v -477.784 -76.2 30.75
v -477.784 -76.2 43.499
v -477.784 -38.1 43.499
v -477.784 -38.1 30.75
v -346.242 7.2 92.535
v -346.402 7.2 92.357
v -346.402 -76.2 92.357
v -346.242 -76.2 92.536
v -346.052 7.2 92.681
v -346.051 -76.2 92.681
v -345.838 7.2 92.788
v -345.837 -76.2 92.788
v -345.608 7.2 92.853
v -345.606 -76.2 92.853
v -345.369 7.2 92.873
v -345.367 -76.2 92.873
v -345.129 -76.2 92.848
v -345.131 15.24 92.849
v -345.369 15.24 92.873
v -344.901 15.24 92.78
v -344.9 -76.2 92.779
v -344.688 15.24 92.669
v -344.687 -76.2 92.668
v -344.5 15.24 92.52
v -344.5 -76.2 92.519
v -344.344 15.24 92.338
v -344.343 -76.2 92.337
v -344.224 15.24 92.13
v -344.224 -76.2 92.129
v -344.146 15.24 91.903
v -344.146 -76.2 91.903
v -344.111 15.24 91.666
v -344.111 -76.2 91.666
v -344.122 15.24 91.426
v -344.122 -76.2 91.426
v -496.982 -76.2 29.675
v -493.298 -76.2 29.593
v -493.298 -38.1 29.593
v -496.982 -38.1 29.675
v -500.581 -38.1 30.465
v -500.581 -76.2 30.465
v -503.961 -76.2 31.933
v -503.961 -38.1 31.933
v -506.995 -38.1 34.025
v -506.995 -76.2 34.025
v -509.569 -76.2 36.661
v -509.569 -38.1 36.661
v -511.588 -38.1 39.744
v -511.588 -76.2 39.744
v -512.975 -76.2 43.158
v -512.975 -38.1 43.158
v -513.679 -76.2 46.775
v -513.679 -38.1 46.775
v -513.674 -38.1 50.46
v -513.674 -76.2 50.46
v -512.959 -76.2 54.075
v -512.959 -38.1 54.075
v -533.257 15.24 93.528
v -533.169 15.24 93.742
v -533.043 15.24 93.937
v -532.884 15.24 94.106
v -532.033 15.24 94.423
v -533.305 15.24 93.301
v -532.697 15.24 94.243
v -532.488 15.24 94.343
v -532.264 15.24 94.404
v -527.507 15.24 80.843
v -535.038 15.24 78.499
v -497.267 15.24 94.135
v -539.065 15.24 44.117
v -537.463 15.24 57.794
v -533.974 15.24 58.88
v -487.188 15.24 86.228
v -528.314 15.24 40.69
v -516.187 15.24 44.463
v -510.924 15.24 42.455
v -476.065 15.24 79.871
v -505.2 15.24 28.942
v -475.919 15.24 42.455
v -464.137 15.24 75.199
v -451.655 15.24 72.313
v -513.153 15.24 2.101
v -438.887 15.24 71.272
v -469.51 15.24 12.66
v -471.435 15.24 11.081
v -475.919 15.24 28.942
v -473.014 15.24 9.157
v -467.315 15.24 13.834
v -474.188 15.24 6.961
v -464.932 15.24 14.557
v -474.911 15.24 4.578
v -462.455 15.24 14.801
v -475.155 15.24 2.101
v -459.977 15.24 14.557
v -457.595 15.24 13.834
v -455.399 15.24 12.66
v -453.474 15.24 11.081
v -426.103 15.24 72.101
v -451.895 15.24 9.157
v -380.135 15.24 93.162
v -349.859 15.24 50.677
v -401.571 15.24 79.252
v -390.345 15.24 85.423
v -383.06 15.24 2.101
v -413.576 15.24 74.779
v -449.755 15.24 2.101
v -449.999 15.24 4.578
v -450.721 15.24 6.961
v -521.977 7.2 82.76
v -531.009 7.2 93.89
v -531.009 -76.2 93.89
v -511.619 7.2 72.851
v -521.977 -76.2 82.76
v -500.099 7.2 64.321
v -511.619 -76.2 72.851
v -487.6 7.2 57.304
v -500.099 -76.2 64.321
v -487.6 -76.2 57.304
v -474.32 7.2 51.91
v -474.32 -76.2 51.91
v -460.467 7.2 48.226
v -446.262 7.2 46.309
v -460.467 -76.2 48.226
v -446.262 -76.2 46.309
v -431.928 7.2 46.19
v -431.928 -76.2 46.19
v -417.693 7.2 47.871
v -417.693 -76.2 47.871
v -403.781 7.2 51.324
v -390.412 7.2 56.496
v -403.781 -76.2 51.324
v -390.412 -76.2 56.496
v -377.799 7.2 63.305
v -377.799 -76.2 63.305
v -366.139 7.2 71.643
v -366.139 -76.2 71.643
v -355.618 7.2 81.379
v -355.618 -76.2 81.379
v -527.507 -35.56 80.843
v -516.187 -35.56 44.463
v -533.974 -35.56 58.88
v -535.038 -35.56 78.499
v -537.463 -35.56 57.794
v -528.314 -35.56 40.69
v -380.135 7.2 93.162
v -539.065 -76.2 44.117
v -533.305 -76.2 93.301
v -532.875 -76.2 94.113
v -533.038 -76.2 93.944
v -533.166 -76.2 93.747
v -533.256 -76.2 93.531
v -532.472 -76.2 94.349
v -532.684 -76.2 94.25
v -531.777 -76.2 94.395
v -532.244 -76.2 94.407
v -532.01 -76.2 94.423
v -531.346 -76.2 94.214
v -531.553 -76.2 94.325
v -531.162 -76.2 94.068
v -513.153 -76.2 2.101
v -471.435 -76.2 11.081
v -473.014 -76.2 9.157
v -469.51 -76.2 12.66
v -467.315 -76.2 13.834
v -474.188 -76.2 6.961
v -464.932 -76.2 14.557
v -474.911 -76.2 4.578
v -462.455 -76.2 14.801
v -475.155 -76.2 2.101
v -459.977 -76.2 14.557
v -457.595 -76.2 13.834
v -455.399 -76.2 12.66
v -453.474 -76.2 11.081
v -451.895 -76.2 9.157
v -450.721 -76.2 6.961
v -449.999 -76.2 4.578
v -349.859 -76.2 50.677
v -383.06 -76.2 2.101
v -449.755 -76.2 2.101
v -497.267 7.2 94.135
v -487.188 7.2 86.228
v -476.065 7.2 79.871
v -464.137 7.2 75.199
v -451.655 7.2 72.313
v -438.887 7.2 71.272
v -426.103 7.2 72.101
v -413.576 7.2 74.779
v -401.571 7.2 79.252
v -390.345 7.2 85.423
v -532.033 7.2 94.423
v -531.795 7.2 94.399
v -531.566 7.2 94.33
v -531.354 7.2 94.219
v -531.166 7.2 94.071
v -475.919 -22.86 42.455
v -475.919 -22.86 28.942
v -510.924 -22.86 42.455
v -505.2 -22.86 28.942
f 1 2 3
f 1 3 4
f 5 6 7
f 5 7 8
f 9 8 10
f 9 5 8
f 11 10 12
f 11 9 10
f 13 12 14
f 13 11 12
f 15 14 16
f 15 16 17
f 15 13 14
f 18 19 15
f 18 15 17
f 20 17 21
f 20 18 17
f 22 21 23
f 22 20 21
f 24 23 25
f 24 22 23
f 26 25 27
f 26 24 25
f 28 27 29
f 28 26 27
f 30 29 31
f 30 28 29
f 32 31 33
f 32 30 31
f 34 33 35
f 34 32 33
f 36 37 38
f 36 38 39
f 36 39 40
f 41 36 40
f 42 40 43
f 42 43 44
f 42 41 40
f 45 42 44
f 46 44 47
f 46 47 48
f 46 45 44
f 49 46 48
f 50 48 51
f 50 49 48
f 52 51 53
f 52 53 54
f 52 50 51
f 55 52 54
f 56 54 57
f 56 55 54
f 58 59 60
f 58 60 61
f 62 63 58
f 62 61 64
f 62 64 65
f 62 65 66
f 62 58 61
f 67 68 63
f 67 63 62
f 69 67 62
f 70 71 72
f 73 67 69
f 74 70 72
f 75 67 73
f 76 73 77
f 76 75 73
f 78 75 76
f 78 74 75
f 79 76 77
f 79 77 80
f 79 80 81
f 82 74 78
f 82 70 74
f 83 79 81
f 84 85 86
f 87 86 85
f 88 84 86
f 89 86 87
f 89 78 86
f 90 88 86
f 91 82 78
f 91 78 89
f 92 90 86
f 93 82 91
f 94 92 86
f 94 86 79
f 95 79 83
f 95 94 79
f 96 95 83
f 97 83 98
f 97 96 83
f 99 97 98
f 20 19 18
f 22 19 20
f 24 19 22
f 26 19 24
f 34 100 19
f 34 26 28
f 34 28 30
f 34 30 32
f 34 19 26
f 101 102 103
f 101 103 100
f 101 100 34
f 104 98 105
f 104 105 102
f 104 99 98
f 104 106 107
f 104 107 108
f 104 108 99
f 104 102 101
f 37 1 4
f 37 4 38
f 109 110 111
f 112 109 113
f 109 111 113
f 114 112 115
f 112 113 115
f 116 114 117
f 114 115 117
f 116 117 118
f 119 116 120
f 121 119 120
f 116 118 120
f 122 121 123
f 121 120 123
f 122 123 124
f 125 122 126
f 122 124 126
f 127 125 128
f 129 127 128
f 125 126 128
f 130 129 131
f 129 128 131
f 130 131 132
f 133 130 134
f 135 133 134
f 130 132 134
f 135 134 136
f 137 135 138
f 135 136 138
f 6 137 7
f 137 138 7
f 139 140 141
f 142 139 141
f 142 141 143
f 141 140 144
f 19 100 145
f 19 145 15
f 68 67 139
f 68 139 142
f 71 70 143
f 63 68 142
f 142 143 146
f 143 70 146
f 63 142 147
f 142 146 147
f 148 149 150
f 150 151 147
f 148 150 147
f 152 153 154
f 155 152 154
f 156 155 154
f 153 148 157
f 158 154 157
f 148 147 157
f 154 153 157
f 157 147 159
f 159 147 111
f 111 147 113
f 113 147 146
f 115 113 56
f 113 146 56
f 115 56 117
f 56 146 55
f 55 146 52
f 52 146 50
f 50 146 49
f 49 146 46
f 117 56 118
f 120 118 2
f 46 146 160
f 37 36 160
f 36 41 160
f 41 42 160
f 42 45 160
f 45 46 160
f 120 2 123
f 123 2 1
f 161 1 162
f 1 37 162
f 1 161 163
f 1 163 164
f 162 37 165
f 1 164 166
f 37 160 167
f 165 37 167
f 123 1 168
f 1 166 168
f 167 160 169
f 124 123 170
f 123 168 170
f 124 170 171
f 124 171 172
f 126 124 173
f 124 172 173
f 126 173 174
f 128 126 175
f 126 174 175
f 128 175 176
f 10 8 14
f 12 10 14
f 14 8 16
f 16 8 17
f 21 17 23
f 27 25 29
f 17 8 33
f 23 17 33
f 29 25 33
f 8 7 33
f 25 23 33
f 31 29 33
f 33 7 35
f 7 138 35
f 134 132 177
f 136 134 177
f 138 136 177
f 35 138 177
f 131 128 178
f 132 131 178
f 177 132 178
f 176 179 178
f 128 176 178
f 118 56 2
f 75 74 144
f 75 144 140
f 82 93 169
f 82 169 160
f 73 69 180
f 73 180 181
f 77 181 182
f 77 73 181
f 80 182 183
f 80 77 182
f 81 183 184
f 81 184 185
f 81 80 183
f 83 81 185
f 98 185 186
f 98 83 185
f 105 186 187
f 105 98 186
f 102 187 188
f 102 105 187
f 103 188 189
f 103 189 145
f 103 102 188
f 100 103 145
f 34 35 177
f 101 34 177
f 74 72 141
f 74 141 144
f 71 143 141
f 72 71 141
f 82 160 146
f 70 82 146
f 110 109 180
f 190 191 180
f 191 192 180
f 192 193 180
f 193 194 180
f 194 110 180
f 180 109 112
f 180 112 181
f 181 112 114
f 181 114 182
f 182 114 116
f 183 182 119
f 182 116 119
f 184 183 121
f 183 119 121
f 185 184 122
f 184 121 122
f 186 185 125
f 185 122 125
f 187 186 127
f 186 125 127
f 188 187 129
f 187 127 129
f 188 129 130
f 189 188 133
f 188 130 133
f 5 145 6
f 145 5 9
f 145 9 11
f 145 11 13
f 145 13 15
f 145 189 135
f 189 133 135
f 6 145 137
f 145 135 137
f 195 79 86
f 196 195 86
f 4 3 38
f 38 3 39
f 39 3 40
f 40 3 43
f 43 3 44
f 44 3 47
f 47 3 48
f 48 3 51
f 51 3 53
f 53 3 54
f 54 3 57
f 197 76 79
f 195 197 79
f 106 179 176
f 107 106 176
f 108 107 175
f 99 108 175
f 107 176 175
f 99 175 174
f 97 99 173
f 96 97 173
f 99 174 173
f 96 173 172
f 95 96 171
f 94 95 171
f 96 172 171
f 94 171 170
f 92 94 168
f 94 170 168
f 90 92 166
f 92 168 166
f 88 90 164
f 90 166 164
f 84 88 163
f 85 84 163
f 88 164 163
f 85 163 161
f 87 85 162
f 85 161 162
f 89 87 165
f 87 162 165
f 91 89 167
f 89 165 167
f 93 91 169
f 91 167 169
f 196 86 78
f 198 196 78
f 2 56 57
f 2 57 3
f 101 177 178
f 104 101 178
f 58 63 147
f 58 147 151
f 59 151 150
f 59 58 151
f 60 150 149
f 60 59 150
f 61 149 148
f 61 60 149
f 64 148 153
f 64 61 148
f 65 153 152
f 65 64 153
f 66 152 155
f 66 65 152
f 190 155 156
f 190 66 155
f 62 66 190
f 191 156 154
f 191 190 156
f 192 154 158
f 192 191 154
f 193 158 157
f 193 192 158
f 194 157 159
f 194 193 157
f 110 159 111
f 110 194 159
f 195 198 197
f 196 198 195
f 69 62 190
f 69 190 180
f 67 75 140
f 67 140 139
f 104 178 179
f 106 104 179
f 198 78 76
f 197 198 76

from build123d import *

# Parameters (mm, degrees)
BOSS_EXTRUDE1_DEPTH      = 15.24
BOSS_EXTRUDE1_DEPTH_BACK = 76.2
FILLET1_R                = 1.27
BOSS_EXTRUDE2_DEPTH      = 8.04
CUT_EXTRUDE1_DEPTH       = 50.8
CUT_EXTRUDE2_DEPTH       = 38.1
CUT_EXTRUDE3_DEPTH       = 38.1


with BuildPart() as part:
    # Sketch3 → Boss-Extrude1 (new, two sides: drawn at the far end of the back side and taken through both)
    with BuildSketch(Plane(origin=(0, 0, 0), x_dir=(1, 0, 0), z_dir=(0, 1, 0)).offset(-BOSS_EXTRUDE1_DEPTH_BACK)):
        with BuildLine():
            Line((-475.15475454, -2.10083146), (-513.153172489, -2.10083146))
            Line((-513.153172489, -2.10083146), (-539.064824243, -44.116848998))
            Line((-539.064824243, -44.116848998), (-532.913087574, -96.64839438))
            ThreePointArc((-532.913087574, -96.64839438), (-438.150016702, -46.02), (-343.386945829, -96.64839438))
            Line((-343.386945829, -96.64839438), (-349.858652302, -50.677017736))
            Line((-349.858652302, -50.677017736), (-383.060284532, -2.10083146))
            Line((-383.060284532, -2.10083146), (-449.75475454, -2.10083146))
            ThreePointArc((-449.75475454, -2.10083146), (-462.45475454, -14.80083146), (-475.15475454, -2.10083146))
        make_face()
    extrude(amount=BOSS_EXTRUDE1_DEPTH + BOSS_EXTRUDE1_DEPTH_BACK)

    # Fillet1
    fillet1_edges = [part.edges().sort_by_distance(p)[0] for p in [
        (-532.913087574, -30.48, 96.64839438),
        (-343.386945829, -30.48, 96.64839438),
    ]]
    fillet(fillet1_edges, radius=FILLET1_R)

    # Sketch4 → Boss-Extrude2 (add)
    with BuildSketch(Plane(origin=(0, 15.24, 0), x_dir=(1, 0, 0), z_dir=(0, 1, 0))):
        with BuildLine():
            Line((-380.135465932, -93.16197835), (-345.369151466, -92.873286736))
            ThreePointArc((-345.369151466, -92.873286736), (-439.104227144, -45.107135711), (-532.033153207, -94.423302399))
            Line((-532.033153207, -94.423302399), (-497.266838741, -94.134610785))
            ThreePointArc((-497.266838741, -94.134610785), (-438.886956078, -71.272475515), (-380.135465932, -93.16197835))
        make_face()
    extrude(amount=-BOSS_EXTRUDE2_DEPTH)

    # Sketch5 → Cut-Extrude1 (cut)
    with BuildSketch(Plane(origin=(0, 15.24, 0), x_dir=(1, 0, 0), z_dir=(0, 1, 0))):
        with BuildLine():
            Line((-528.314052027, -40.689759741), (-516.187462201, -44.462798197))
            Line((-516.187462201, -44.462798197), (-527.50657757, -80.842567675))
            Line((-527.50657757, -80.842567675), (-695.232596141, -28.656691245))
            ThreePointArc((-695.232596141, -28.656691245), (-715.264918055, 13.486917548), (-671.654107709, 30.084354228))
            ThreePointArc((-671.654107709, 30.084354228), (-668.860719824, 16.856608708), (-682.026961544, 13.786373146))
            ThreePointArc((-682.026961544, 13.786373146), (-697.926589826, 5.432821776), (-689.573038456, -10.466806506))
            Line((-689.573038456, -10.466806506), (-533.973609712, -58.87964448))
            Line((-533.973609712, -58.87964448), (-528.314052027, -40.689759741))
        make_face()
    extrude(amount=-CUT_EXTRUDE1_DEPTH, mode=Mode.SUBTRACT)

    # Sketch6 → Cut-Extrude2 (cut)
    with BuildSketch(Plane(origin=(0, 15.24, 0), x_dir=(1, 0, 0), z_dir=(0, 1, 0))):
        Polygon((-505.199519379, -28.941561379), (-510.924193781, -42.454904444), (-475.918740123, -42.454904444), (-475.918740123, -28.941649602), align=None)
    extrude(amount=-CUT_EXTRUDE2_DEPTH, mode=Mode.SUBTRACT)

    # Sketch7 → Cut-Extrude3 (cut)
    with BuildSketch(Plane.XZ.offset(76.2)):
        with BuildLine():
            Line((-477.784341144, 30.750375257), (-493.297876549, 29.59254273))
            ThreePointArc((-493.297876549, 29.59254273), (-509.568926068, 36.66140776), (-512.958981795, 54.074719549))
            Line((-512.958981795, 54.074719549), (-477.784341144, 43.499133869))
            Line((-477.784341144, 43.499133869), (-477.784341144, 30.750375257))
        make_face()
    extrude(amount=-CUT_EXTRUDE3_DEPTH, mode=Mode.SUBTRACT)


solid = part.part
